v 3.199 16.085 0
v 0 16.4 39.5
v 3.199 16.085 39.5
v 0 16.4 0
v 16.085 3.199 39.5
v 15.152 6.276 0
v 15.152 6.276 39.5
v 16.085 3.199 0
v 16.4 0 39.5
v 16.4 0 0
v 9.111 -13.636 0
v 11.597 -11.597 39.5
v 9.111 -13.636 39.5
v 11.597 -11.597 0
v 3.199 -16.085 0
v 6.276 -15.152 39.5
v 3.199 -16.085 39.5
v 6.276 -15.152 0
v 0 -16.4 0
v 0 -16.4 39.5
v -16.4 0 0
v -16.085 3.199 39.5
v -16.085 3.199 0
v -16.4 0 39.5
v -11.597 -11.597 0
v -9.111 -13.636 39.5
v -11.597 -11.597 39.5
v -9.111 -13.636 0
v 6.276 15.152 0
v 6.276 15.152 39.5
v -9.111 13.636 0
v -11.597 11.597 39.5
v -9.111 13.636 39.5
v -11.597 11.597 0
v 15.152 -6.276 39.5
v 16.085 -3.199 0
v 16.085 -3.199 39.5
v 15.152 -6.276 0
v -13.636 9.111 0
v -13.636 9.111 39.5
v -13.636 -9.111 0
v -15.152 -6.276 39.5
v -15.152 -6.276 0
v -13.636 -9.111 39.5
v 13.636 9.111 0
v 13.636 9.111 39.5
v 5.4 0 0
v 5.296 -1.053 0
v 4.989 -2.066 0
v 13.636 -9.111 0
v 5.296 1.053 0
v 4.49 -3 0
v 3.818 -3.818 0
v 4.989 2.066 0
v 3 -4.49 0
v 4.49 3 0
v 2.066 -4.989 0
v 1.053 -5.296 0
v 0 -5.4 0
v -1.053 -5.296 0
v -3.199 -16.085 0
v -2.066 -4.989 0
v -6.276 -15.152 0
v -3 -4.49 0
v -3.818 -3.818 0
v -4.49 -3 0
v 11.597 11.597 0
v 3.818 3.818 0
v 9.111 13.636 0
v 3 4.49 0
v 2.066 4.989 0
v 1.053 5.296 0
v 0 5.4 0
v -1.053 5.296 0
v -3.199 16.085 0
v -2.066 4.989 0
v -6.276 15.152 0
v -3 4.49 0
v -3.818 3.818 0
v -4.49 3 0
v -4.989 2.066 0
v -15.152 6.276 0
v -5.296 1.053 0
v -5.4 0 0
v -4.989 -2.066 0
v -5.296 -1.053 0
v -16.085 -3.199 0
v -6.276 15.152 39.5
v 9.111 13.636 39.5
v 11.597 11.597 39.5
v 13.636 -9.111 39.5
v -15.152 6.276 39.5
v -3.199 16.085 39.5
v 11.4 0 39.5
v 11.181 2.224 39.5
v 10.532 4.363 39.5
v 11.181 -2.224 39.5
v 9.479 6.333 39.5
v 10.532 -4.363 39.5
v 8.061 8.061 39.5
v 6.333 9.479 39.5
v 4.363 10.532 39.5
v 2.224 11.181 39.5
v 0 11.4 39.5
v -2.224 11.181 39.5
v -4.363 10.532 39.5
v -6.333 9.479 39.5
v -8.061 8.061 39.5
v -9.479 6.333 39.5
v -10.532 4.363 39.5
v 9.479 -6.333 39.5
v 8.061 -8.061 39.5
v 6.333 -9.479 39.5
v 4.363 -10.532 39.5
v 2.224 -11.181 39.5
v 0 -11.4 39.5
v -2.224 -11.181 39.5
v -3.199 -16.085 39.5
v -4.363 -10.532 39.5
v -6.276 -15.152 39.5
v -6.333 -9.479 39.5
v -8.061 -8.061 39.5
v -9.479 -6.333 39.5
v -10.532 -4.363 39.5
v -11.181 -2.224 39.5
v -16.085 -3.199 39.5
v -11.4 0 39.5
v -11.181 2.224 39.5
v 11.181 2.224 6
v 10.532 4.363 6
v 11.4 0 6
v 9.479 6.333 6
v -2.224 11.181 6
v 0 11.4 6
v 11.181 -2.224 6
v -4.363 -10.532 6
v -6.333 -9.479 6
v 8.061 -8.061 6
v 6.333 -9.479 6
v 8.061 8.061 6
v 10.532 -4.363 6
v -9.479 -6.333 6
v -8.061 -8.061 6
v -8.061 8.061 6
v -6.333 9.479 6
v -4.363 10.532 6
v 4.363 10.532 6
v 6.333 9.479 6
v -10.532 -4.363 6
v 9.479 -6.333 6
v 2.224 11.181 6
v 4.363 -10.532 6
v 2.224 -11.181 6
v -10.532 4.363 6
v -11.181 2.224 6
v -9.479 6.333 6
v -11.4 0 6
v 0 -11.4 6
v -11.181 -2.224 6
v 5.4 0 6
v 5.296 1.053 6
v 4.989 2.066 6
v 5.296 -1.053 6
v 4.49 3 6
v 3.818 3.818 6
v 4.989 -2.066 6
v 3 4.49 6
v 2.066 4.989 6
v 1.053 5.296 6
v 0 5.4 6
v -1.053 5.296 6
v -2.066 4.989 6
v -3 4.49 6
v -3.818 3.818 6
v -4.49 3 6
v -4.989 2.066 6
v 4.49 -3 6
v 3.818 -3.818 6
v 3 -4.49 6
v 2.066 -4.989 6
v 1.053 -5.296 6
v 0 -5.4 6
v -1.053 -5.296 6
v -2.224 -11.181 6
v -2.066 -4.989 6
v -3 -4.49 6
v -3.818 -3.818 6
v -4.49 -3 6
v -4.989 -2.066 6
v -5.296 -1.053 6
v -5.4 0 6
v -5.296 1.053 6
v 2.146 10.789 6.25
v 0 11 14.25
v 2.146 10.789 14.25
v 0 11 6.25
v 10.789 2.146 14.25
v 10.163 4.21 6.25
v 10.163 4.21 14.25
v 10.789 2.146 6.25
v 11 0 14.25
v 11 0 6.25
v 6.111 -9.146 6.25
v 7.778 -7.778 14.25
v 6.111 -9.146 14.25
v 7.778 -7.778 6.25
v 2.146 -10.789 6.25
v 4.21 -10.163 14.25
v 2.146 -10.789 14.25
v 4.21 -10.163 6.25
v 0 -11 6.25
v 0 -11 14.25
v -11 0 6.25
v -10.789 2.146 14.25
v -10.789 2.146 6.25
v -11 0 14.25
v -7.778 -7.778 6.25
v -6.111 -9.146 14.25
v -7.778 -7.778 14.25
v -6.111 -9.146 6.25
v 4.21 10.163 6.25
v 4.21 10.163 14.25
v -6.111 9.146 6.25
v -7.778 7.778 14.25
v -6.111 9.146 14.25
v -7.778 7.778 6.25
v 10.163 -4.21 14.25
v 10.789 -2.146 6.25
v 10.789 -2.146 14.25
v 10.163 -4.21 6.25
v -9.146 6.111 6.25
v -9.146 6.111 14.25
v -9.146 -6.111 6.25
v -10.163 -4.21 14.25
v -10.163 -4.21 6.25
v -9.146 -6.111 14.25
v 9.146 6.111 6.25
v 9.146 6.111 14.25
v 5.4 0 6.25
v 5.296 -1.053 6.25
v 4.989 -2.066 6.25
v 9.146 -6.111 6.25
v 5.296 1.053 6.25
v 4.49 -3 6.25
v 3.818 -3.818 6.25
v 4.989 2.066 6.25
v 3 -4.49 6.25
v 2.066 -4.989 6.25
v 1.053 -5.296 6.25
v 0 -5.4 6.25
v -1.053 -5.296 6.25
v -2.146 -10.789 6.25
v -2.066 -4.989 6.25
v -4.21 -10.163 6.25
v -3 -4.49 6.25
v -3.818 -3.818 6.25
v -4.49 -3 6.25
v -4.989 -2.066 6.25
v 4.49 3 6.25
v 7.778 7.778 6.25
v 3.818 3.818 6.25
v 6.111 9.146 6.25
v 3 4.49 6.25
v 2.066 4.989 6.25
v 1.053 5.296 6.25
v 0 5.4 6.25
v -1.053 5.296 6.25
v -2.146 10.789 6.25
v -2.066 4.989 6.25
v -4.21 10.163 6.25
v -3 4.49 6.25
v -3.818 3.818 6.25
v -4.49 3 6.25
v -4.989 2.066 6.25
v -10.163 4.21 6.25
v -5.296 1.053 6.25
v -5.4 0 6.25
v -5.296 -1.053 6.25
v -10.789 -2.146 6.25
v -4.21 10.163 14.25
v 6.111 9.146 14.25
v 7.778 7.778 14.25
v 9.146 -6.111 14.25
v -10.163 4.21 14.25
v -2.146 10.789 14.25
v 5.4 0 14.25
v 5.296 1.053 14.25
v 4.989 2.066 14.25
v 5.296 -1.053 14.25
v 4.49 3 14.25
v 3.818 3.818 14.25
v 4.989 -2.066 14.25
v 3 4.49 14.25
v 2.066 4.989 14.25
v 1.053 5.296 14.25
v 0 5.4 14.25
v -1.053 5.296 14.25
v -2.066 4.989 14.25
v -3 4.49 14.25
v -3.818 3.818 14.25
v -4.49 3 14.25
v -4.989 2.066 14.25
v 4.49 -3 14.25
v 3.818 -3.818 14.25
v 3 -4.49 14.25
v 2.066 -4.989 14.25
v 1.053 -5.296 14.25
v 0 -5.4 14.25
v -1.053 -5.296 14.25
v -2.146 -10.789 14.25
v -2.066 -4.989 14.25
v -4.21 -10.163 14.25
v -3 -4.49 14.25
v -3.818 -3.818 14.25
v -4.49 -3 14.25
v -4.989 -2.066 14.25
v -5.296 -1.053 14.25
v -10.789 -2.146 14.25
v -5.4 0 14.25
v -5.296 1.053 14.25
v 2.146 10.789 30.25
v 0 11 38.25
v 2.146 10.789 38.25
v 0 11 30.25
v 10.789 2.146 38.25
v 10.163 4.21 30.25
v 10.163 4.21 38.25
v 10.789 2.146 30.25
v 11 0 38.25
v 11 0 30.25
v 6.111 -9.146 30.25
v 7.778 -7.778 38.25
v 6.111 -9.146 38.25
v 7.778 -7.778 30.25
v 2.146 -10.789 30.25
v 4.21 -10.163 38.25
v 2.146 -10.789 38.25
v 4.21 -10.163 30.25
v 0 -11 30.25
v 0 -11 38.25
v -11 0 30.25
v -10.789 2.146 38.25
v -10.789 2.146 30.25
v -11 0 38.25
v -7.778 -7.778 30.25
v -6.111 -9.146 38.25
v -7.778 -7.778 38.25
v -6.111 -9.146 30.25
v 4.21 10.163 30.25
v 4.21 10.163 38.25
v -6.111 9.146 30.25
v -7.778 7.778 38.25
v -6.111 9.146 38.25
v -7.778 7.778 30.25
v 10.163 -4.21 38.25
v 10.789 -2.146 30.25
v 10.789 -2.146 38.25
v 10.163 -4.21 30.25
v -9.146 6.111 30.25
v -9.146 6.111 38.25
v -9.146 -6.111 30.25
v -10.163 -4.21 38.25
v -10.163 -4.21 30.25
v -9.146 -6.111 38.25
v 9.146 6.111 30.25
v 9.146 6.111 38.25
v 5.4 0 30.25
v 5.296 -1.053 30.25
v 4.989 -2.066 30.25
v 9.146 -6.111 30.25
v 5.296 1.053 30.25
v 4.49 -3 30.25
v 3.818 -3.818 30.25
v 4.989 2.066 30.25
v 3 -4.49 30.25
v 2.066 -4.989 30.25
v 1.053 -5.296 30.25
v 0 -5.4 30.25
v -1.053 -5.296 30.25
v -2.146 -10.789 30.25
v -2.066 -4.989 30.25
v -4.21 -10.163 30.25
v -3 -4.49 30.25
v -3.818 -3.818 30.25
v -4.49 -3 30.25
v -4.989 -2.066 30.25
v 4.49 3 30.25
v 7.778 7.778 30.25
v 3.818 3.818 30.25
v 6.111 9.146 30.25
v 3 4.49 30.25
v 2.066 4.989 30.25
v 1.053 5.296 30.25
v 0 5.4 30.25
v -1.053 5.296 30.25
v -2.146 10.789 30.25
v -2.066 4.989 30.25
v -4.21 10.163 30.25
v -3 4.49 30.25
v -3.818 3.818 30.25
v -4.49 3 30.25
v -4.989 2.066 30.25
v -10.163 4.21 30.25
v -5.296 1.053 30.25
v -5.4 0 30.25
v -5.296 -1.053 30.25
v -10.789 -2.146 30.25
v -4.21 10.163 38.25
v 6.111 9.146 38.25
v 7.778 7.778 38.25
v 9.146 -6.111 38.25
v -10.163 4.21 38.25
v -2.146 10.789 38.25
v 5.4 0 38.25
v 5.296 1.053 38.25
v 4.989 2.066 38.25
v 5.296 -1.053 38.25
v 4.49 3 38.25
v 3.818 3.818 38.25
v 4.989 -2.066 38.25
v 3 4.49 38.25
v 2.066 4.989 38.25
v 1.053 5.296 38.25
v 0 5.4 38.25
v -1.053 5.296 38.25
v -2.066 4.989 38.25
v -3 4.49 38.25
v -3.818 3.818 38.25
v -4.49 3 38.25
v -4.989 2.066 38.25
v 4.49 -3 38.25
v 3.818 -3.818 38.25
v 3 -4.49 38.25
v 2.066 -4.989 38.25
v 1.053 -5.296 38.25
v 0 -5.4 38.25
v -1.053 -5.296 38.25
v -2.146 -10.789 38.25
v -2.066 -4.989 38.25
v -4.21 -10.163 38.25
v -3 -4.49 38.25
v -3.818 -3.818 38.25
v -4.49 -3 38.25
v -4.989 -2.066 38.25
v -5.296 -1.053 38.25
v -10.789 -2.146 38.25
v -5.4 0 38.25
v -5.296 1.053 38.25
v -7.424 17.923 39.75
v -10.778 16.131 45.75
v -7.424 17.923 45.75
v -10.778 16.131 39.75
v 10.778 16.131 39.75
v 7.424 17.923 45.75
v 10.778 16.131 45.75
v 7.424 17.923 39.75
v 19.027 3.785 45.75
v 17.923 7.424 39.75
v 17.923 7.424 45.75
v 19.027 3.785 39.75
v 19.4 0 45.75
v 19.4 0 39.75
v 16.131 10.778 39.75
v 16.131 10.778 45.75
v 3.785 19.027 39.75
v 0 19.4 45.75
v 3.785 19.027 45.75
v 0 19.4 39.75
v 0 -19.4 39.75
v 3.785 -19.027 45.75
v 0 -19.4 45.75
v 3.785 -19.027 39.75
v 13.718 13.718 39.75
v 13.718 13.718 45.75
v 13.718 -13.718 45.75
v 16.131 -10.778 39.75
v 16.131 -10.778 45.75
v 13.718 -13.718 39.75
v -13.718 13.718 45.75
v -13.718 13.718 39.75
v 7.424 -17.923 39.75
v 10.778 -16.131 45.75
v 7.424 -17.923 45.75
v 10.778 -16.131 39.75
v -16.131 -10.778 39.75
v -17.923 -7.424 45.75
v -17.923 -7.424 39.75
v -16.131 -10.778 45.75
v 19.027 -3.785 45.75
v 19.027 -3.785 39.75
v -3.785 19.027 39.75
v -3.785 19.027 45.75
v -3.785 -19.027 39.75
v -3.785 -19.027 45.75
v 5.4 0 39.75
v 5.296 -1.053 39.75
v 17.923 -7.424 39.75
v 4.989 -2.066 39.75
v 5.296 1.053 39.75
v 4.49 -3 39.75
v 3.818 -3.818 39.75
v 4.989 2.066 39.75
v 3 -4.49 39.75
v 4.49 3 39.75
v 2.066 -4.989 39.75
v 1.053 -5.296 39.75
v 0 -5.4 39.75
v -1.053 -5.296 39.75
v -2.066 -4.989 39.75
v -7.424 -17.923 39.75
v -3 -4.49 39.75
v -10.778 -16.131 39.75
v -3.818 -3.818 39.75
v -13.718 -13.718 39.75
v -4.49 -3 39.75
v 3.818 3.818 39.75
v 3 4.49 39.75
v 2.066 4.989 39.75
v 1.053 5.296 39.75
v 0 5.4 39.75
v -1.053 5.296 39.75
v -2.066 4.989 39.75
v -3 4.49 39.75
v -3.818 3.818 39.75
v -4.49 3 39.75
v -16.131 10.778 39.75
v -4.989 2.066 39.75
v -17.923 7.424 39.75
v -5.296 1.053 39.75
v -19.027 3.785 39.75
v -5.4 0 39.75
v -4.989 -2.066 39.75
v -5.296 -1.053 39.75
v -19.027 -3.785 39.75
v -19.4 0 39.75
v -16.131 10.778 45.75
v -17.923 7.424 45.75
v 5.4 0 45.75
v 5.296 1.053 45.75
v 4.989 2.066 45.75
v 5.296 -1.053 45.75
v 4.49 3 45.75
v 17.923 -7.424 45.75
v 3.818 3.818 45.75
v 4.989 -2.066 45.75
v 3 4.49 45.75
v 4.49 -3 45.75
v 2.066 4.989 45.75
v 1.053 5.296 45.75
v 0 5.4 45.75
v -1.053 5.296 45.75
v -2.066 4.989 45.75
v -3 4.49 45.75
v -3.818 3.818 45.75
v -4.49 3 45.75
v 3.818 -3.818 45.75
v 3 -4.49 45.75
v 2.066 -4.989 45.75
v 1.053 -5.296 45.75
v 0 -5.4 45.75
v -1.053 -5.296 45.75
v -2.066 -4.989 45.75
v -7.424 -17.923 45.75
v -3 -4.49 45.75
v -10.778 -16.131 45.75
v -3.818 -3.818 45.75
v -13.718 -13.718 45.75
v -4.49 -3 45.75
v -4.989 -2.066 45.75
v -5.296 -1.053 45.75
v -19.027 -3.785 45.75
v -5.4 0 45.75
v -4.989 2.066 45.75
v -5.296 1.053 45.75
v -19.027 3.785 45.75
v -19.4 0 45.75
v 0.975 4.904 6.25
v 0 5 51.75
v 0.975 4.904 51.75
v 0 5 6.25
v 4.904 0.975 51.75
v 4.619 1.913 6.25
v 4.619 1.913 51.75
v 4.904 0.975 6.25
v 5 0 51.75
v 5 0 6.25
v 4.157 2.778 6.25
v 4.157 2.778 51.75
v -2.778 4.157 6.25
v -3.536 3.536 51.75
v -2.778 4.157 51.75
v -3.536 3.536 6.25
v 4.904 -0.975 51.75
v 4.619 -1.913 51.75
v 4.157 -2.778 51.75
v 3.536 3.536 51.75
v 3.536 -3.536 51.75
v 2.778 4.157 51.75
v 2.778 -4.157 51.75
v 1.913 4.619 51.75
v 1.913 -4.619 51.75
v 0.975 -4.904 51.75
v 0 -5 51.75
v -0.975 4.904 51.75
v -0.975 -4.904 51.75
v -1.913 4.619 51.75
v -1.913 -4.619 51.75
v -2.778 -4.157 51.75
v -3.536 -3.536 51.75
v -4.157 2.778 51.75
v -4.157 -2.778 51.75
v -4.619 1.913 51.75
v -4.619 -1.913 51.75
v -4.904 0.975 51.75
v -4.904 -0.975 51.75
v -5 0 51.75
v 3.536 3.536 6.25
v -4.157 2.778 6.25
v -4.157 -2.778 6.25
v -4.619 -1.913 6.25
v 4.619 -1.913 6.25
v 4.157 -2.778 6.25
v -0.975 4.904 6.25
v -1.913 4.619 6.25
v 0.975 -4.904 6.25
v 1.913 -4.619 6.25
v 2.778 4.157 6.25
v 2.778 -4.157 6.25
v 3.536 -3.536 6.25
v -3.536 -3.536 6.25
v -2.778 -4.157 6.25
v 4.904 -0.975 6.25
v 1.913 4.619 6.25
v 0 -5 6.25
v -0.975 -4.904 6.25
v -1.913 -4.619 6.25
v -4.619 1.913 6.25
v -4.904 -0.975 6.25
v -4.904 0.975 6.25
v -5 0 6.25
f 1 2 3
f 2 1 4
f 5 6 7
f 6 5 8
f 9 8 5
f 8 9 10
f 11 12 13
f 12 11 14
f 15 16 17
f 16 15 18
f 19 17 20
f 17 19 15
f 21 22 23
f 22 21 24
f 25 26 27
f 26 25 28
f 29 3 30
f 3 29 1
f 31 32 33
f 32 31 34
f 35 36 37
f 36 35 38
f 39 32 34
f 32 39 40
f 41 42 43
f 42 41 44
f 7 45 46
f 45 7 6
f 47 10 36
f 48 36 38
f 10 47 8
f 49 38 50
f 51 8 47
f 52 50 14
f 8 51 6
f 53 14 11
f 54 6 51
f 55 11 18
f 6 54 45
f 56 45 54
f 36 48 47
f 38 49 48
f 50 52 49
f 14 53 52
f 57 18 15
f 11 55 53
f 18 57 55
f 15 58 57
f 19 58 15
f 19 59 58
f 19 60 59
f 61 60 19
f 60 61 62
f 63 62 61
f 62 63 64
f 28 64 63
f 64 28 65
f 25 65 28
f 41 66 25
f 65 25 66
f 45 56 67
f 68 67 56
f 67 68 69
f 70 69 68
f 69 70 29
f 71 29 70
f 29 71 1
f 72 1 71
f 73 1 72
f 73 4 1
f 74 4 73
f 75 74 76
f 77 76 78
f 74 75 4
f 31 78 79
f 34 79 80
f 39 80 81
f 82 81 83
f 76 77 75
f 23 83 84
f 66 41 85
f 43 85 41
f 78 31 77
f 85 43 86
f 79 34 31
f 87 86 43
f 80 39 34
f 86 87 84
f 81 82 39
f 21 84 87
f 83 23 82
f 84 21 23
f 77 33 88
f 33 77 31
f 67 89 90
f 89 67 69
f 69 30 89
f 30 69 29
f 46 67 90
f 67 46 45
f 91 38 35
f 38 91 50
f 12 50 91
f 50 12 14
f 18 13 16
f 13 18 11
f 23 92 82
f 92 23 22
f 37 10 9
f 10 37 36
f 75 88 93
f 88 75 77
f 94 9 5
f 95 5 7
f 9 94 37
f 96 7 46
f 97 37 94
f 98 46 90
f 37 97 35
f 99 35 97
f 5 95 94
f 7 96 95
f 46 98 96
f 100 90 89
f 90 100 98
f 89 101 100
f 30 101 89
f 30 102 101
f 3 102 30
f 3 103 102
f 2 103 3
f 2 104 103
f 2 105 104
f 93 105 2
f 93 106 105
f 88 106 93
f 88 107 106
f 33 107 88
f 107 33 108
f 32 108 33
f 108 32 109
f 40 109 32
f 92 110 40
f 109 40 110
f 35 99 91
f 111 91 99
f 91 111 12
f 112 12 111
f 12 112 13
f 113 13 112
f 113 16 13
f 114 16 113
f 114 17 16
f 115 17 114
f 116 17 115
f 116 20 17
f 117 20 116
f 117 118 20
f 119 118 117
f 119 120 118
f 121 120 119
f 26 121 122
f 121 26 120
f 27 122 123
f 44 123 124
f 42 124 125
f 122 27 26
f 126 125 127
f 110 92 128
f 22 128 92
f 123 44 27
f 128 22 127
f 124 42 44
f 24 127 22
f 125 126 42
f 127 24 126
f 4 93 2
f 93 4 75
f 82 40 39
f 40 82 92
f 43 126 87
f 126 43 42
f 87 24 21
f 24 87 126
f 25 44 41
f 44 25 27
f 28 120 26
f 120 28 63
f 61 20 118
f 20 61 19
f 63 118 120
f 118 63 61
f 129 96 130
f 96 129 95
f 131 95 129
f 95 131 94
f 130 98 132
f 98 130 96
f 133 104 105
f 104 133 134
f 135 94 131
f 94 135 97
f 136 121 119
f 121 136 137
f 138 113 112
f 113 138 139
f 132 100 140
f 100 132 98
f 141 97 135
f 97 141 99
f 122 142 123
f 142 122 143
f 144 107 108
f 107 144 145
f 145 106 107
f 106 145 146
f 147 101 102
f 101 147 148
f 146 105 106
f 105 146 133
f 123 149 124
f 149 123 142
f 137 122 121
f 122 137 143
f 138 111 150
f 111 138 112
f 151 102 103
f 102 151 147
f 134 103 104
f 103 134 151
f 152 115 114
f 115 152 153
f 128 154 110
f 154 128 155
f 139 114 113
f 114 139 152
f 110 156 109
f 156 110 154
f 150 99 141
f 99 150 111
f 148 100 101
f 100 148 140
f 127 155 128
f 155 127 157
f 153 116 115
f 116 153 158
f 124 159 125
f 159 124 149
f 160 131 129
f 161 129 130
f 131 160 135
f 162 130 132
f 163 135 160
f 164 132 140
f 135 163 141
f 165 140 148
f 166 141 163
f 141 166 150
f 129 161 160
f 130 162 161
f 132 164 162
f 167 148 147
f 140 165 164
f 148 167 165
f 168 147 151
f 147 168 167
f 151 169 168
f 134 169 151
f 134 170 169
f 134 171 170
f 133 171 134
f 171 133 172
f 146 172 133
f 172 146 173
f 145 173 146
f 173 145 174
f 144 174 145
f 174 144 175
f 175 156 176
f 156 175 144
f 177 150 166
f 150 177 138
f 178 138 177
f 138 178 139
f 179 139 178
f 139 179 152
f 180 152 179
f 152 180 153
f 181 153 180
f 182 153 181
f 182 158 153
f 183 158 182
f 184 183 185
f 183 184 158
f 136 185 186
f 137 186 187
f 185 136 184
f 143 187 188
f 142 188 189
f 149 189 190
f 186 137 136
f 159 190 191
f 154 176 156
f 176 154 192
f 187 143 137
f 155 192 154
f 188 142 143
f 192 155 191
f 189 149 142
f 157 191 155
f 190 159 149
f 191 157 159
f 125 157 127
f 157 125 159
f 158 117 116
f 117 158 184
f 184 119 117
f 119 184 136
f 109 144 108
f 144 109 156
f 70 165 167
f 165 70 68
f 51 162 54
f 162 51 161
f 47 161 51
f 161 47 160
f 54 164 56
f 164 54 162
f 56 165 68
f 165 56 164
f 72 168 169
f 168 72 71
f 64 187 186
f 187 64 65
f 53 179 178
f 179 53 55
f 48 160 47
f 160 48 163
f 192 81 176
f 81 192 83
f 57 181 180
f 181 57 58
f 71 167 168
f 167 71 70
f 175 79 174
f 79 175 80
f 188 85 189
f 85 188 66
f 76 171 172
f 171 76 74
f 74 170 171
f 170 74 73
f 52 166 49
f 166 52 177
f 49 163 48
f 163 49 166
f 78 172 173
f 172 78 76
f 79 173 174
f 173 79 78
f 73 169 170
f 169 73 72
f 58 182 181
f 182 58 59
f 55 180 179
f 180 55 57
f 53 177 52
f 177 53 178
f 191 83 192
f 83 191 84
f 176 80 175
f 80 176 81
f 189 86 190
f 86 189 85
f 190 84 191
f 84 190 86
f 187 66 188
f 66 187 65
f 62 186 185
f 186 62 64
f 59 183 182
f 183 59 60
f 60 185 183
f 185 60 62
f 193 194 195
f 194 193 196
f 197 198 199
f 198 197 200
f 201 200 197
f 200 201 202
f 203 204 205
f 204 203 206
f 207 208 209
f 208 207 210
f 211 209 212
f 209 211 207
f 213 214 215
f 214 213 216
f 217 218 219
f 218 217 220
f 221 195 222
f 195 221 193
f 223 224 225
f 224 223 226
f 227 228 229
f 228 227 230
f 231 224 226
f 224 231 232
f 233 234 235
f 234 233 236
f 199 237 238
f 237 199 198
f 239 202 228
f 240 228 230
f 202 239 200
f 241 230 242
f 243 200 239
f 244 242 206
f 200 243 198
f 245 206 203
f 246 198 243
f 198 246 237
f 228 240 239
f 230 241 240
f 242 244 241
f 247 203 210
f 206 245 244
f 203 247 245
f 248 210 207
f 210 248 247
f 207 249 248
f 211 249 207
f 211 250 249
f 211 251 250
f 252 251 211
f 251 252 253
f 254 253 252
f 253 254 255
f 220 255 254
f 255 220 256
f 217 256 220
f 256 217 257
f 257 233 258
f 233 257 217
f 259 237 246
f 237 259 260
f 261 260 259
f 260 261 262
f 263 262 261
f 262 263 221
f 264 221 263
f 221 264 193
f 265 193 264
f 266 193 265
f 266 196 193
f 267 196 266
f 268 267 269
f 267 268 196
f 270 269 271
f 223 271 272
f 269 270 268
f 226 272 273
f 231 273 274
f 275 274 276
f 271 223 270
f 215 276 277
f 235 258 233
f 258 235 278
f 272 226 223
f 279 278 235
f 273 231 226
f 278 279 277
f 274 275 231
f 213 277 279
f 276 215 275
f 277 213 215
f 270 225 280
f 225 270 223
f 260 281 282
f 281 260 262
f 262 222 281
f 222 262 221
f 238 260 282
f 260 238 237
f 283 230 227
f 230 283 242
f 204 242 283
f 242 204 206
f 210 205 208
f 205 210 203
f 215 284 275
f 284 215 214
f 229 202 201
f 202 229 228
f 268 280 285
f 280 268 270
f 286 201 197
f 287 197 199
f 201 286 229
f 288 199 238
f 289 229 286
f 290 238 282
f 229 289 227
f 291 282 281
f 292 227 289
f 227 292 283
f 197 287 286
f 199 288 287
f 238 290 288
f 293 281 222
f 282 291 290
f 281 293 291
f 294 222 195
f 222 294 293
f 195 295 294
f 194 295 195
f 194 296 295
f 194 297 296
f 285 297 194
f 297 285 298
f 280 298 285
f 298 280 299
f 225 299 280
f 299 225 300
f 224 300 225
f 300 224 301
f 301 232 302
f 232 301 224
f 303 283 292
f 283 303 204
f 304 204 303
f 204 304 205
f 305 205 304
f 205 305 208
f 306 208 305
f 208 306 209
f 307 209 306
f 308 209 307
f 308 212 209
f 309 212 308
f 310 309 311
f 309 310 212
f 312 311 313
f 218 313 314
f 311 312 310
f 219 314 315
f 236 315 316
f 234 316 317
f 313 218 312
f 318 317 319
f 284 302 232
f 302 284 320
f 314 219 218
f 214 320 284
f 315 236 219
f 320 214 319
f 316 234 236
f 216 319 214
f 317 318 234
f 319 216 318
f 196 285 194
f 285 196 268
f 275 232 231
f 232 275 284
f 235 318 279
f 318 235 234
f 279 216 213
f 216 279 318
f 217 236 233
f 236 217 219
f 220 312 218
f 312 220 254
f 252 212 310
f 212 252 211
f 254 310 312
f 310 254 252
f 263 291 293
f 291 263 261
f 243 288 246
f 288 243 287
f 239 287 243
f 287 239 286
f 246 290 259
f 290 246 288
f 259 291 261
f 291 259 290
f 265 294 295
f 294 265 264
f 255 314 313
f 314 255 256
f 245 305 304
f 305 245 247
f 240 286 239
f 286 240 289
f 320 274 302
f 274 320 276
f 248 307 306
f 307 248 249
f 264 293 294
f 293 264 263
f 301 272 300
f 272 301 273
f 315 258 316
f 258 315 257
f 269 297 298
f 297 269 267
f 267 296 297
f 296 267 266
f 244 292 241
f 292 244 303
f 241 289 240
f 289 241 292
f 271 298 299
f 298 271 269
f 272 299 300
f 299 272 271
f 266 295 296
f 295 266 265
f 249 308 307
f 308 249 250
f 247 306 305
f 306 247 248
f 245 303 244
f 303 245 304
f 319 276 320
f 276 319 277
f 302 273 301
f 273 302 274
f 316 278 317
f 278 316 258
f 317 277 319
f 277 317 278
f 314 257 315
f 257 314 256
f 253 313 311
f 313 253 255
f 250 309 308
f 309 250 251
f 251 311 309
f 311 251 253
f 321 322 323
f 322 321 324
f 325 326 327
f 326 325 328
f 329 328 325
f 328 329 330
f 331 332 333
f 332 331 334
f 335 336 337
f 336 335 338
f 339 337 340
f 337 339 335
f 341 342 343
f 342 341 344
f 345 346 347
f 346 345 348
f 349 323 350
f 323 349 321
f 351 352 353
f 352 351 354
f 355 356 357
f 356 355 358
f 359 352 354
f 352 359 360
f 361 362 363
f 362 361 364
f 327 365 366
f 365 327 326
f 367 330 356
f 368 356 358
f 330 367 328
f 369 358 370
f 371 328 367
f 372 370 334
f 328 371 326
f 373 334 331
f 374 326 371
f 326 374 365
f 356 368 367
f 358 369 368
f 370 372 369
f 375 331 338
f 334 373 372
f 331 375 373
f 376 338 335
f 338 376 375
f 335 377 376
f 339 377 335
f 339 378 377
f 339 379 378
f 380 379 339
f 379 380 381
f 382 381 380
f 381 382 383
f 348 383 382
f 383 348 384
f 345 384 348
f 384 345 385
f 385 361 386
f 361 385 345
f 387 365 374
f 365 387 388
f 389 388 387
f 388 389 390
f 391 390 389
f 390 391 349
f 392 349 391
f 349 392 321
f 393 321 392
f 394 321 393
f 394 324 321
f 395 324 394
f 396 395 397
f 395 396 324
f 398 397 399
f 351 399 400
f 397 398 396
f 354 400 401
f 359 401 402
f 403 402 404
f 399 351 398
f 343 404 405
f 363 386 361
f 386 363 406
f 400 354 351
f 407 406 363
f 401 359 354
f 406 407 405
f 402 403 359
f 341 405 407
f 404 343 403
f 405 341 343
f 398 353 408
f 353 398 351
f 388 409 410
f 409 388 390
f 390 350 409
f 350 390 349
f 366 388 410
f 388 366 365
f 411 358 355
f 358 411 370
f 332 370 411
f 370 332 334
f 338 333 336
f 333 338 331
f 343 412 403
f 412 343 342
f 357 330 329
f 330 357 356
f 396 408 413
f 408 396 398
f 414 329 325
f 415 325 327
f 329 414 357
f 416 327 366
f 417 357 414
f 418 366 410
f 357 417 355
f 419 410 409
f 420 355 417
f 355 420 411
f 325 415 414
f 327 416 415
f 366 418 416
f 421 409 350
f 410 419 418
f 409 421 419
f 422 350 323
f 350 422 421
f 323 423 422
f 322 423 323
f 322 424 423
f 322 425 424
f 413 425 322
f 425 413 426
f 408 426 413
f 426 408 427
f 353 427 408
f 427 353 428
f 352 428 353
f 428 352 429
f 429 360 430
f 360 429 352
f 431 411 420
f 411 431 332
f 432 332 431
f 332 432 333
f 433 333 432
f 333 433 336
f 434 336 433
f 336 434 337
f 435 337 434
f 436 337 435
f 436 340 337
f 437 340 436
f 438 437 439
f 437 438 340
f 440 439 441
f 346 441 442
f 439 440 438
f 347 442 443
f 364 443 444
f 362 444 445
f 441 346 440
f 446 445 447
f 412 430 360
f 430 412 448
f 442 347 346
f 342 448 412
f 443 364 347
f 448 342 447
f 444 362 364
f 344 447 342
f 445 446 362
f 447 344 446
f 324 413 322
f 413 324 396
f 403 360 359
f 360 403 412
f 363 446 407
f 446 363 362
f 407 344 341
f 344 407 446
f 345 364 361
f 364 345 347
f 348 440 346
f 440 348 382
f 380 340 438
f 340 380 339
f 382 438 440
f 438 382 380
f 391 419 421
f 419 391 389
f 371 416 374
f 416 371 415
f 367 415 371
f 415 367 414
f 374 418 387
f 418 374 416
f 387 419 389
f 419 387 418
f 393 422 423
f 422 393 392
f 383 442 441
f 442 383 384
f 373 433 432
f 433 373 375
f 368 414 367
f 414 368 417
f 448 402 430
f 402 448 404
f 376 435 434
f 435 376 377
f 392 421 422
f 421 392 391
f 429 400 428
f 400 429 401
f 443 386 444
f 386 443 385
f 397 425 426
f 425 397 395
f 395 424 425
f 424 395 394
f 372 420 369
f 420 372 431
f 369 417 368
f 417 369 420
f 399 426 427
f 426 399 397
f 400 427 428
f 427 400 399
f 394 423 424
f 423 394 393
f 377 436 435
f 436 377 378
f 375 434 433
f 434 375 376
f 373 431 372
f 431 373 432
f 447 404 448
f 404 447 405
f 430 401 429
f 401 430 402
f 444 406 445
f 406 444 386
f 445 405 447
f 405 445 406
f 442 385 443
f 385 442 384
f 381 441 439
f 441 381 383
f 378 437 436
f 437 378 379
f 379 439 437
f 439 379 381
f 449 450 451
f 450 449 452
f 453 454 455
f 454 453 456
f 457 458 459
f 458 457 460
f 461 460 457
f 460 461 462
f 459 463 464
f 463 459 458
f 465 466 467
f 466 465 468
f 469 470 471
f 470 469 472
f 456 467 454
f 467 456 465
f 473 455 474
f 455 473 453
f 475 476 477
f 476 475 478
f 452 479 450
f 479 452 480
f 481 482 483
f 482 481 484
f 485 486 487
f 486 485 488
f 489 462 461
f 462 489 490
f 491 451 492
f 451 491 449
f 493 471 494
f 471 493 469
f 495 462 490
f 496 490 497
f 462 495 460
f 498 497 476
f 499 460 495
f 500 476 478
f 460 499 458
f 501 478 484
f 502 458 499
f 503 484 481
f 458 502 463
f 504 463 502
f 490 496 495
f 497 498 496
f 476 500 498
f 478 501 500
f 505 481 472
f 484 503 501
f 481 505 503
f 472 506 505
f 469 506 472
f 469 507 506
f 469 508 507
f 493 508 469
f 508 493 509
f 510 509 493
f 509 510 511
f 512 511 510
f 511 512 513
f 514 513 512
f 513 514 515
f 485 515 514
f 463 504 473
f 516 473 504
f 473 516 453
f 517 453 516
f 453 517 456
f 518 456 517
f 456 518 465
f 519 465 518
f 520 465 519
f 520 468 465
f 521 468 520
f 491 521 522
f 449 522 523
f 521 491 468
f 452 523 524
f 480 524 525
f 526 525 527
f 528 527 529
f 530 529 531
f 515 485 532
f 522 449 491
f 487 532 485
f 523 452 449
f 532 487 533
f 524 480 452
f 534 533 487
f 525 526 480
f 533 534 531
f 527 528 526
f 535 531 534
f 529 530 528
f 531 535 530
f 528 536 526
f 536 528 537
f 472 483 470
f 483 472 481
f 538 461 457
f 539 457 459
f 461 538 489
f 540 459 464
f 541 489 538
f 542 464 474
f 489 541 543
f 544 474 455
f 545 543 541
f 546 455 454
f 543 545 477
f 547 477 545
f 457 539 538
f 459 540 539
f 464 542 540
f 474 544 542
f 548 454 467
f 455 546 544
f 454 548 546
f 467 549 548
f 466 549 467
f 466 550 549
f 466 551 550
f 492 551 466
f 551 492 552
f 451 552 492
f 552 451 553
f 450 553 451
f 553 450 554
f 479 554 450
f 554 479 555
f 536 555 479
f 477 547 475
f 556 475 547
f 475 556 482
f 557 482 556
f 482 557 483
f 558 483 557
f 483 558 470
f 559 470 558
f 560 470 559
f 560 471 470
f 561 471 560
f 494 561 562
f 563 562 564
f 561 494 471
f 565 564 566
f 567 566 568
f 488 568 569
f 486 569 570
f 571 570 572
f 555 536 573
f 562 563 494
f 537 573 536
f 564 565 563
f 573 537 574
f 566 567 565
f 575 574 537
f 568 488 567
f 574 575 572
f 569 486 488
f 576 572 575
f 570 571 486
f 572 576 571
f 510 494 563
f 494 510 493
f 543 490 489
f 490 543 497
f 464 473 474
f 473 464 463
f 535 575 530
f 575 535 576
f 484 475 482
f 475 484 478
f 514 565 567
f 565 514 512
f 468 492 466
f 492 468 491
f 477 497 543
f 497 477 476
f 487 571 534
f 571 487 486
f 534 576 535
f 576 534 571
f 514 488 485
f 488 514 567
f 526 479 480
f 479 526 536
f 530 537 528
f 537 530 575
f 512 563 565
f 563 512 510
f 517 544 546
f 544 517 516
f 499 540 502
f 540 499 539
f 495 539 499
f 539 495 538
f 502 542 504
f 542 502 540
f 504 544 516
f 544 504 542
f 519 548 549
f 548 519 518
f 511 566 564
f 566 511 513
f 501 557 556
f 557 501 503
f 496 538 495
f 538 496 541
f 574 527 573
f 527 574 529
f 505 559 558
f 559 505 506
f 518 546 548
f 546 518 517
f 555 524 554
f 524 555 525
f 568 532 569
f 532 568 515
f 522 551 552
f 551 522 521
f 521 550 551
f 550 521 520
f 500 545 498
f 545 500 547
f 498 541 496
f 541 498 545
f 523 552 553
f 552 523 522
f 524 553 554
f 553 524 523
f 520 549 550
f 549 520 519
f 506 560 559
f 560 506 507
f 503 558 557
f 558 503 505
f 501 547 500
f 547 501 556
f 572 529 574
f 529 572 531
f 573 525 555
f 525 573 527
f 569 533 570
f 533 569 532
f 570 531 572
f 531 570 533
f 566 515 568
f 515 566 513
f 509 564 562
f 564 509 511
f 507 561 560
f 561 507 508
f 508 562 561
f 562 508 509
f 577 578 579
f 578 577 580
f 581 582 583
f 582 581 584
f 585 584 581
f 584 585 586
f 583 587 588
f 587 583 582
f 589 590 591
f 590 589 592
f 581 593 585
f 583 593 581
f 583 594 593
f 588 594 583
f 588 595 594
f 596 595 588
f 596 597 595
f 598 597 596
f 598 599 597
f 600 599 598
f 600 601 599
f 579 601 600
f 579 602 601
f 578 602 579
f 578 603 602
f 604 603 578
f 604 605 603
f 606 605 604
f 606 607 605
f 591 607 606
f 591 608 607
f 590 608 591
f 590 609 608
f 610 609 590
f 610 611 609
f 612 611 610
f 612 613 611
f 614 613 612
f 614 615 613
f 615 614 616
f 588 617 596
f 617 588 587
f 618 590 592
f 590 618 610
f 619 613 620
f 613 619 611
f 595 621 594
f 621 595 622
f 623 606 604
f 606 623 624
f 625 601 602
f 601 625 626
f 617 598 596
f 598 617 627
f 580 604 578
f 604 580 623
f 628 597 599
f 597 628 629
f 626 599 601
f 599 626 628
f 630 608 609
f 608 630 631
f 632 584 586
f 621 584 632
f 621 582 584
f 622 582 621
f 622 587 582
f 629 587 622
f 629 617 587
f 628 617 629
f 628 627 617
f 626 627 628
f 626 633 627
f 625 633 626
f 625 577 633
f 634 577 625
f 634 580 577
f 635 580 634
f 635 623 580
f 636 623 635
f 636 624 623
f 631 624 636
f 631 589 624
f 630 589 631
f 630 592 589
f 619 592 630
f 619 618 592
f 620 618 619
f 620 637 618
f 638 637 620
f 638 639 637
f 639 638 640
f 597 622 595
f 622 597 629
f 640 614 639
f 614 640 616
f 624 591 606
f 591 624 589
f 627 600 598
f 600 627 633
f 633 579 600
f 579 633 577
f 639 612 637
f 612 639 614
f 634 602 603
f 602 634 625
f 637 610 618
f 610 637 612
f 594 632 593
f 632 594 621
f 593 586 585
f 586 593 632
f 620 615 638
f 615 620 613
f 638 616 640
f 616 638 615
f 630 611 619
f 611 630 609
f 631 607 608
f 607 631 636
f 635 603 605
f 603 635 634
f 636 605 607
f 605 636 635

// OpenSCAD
$fn = 32;

// ------------------------------------------------------------------------
// Shaft station: cup d32.8 x 39.5 mm, shaft d10
// Every part is its own module, assembly() places every instance.
// ------------------------------------------------------------------------

// --- part 1 ---
module housing_cup() {
  difference() {
    cylinder(h = 39.5, d = 32.8);
    translate([0, 0, 6]) cylinder(h = 34.5, d = 22.8);
    translate([0, 0, -1]) cylinder(h = 8, d = 10.8);
  }
}

// --- part 2 ---
module bearing_lower() {
  difference() {
      translate([0, 0, 0]) cylinder(h = 8, d = 22);
      translate([0, 0, -1]) cylinder(h = 10, d = 10.8);
    }
}

// --- part 3 ---
module bearing_upper() {
  difference() {
      translate([0, 0, 0]) cylinder(h = 8, d = 22);
      translate([0, 0, -1]) cylinder(h = 10, d = 10.8);
    }
}

// --- part 4 ---
module station_shaft() {
  translate([0, 0, -22.75]) cylinder(h = 45.5, d = 10);
}

// --- part 5 ---
module station_cover() {
  difference() {
    cylinder(h = 6, d = 38.8);
    translate([0, 0, -1]) cylinder(h = 8, d = 10.8);
  }
}

// --- assembly ---
module assembly() {
  color([0.80, 0.24, 0.20]) translate([0, 0, 0]) rotate([0, 0, 0]) housing_cup();
  color([0.20, 0.45, 0.75]) translate([0, 0, 6.25]) rotate([0, 0, 0]) bearing_lower();
  color([0.25, 0.62, 0.32]) translate([0, 0, 30.25]) rotate([0, 0, 0]) bearing_upper();
  color([0.92, 0.70, 0.18]) translate([0, 0, 29]) rotate([0, 0, 0]) station_shaft();
  color([0.58, 0.35, 0.70]) translate([0, 0, 39.75]) rotate([0, 0, 0]) station_cover();
}

assembly();
